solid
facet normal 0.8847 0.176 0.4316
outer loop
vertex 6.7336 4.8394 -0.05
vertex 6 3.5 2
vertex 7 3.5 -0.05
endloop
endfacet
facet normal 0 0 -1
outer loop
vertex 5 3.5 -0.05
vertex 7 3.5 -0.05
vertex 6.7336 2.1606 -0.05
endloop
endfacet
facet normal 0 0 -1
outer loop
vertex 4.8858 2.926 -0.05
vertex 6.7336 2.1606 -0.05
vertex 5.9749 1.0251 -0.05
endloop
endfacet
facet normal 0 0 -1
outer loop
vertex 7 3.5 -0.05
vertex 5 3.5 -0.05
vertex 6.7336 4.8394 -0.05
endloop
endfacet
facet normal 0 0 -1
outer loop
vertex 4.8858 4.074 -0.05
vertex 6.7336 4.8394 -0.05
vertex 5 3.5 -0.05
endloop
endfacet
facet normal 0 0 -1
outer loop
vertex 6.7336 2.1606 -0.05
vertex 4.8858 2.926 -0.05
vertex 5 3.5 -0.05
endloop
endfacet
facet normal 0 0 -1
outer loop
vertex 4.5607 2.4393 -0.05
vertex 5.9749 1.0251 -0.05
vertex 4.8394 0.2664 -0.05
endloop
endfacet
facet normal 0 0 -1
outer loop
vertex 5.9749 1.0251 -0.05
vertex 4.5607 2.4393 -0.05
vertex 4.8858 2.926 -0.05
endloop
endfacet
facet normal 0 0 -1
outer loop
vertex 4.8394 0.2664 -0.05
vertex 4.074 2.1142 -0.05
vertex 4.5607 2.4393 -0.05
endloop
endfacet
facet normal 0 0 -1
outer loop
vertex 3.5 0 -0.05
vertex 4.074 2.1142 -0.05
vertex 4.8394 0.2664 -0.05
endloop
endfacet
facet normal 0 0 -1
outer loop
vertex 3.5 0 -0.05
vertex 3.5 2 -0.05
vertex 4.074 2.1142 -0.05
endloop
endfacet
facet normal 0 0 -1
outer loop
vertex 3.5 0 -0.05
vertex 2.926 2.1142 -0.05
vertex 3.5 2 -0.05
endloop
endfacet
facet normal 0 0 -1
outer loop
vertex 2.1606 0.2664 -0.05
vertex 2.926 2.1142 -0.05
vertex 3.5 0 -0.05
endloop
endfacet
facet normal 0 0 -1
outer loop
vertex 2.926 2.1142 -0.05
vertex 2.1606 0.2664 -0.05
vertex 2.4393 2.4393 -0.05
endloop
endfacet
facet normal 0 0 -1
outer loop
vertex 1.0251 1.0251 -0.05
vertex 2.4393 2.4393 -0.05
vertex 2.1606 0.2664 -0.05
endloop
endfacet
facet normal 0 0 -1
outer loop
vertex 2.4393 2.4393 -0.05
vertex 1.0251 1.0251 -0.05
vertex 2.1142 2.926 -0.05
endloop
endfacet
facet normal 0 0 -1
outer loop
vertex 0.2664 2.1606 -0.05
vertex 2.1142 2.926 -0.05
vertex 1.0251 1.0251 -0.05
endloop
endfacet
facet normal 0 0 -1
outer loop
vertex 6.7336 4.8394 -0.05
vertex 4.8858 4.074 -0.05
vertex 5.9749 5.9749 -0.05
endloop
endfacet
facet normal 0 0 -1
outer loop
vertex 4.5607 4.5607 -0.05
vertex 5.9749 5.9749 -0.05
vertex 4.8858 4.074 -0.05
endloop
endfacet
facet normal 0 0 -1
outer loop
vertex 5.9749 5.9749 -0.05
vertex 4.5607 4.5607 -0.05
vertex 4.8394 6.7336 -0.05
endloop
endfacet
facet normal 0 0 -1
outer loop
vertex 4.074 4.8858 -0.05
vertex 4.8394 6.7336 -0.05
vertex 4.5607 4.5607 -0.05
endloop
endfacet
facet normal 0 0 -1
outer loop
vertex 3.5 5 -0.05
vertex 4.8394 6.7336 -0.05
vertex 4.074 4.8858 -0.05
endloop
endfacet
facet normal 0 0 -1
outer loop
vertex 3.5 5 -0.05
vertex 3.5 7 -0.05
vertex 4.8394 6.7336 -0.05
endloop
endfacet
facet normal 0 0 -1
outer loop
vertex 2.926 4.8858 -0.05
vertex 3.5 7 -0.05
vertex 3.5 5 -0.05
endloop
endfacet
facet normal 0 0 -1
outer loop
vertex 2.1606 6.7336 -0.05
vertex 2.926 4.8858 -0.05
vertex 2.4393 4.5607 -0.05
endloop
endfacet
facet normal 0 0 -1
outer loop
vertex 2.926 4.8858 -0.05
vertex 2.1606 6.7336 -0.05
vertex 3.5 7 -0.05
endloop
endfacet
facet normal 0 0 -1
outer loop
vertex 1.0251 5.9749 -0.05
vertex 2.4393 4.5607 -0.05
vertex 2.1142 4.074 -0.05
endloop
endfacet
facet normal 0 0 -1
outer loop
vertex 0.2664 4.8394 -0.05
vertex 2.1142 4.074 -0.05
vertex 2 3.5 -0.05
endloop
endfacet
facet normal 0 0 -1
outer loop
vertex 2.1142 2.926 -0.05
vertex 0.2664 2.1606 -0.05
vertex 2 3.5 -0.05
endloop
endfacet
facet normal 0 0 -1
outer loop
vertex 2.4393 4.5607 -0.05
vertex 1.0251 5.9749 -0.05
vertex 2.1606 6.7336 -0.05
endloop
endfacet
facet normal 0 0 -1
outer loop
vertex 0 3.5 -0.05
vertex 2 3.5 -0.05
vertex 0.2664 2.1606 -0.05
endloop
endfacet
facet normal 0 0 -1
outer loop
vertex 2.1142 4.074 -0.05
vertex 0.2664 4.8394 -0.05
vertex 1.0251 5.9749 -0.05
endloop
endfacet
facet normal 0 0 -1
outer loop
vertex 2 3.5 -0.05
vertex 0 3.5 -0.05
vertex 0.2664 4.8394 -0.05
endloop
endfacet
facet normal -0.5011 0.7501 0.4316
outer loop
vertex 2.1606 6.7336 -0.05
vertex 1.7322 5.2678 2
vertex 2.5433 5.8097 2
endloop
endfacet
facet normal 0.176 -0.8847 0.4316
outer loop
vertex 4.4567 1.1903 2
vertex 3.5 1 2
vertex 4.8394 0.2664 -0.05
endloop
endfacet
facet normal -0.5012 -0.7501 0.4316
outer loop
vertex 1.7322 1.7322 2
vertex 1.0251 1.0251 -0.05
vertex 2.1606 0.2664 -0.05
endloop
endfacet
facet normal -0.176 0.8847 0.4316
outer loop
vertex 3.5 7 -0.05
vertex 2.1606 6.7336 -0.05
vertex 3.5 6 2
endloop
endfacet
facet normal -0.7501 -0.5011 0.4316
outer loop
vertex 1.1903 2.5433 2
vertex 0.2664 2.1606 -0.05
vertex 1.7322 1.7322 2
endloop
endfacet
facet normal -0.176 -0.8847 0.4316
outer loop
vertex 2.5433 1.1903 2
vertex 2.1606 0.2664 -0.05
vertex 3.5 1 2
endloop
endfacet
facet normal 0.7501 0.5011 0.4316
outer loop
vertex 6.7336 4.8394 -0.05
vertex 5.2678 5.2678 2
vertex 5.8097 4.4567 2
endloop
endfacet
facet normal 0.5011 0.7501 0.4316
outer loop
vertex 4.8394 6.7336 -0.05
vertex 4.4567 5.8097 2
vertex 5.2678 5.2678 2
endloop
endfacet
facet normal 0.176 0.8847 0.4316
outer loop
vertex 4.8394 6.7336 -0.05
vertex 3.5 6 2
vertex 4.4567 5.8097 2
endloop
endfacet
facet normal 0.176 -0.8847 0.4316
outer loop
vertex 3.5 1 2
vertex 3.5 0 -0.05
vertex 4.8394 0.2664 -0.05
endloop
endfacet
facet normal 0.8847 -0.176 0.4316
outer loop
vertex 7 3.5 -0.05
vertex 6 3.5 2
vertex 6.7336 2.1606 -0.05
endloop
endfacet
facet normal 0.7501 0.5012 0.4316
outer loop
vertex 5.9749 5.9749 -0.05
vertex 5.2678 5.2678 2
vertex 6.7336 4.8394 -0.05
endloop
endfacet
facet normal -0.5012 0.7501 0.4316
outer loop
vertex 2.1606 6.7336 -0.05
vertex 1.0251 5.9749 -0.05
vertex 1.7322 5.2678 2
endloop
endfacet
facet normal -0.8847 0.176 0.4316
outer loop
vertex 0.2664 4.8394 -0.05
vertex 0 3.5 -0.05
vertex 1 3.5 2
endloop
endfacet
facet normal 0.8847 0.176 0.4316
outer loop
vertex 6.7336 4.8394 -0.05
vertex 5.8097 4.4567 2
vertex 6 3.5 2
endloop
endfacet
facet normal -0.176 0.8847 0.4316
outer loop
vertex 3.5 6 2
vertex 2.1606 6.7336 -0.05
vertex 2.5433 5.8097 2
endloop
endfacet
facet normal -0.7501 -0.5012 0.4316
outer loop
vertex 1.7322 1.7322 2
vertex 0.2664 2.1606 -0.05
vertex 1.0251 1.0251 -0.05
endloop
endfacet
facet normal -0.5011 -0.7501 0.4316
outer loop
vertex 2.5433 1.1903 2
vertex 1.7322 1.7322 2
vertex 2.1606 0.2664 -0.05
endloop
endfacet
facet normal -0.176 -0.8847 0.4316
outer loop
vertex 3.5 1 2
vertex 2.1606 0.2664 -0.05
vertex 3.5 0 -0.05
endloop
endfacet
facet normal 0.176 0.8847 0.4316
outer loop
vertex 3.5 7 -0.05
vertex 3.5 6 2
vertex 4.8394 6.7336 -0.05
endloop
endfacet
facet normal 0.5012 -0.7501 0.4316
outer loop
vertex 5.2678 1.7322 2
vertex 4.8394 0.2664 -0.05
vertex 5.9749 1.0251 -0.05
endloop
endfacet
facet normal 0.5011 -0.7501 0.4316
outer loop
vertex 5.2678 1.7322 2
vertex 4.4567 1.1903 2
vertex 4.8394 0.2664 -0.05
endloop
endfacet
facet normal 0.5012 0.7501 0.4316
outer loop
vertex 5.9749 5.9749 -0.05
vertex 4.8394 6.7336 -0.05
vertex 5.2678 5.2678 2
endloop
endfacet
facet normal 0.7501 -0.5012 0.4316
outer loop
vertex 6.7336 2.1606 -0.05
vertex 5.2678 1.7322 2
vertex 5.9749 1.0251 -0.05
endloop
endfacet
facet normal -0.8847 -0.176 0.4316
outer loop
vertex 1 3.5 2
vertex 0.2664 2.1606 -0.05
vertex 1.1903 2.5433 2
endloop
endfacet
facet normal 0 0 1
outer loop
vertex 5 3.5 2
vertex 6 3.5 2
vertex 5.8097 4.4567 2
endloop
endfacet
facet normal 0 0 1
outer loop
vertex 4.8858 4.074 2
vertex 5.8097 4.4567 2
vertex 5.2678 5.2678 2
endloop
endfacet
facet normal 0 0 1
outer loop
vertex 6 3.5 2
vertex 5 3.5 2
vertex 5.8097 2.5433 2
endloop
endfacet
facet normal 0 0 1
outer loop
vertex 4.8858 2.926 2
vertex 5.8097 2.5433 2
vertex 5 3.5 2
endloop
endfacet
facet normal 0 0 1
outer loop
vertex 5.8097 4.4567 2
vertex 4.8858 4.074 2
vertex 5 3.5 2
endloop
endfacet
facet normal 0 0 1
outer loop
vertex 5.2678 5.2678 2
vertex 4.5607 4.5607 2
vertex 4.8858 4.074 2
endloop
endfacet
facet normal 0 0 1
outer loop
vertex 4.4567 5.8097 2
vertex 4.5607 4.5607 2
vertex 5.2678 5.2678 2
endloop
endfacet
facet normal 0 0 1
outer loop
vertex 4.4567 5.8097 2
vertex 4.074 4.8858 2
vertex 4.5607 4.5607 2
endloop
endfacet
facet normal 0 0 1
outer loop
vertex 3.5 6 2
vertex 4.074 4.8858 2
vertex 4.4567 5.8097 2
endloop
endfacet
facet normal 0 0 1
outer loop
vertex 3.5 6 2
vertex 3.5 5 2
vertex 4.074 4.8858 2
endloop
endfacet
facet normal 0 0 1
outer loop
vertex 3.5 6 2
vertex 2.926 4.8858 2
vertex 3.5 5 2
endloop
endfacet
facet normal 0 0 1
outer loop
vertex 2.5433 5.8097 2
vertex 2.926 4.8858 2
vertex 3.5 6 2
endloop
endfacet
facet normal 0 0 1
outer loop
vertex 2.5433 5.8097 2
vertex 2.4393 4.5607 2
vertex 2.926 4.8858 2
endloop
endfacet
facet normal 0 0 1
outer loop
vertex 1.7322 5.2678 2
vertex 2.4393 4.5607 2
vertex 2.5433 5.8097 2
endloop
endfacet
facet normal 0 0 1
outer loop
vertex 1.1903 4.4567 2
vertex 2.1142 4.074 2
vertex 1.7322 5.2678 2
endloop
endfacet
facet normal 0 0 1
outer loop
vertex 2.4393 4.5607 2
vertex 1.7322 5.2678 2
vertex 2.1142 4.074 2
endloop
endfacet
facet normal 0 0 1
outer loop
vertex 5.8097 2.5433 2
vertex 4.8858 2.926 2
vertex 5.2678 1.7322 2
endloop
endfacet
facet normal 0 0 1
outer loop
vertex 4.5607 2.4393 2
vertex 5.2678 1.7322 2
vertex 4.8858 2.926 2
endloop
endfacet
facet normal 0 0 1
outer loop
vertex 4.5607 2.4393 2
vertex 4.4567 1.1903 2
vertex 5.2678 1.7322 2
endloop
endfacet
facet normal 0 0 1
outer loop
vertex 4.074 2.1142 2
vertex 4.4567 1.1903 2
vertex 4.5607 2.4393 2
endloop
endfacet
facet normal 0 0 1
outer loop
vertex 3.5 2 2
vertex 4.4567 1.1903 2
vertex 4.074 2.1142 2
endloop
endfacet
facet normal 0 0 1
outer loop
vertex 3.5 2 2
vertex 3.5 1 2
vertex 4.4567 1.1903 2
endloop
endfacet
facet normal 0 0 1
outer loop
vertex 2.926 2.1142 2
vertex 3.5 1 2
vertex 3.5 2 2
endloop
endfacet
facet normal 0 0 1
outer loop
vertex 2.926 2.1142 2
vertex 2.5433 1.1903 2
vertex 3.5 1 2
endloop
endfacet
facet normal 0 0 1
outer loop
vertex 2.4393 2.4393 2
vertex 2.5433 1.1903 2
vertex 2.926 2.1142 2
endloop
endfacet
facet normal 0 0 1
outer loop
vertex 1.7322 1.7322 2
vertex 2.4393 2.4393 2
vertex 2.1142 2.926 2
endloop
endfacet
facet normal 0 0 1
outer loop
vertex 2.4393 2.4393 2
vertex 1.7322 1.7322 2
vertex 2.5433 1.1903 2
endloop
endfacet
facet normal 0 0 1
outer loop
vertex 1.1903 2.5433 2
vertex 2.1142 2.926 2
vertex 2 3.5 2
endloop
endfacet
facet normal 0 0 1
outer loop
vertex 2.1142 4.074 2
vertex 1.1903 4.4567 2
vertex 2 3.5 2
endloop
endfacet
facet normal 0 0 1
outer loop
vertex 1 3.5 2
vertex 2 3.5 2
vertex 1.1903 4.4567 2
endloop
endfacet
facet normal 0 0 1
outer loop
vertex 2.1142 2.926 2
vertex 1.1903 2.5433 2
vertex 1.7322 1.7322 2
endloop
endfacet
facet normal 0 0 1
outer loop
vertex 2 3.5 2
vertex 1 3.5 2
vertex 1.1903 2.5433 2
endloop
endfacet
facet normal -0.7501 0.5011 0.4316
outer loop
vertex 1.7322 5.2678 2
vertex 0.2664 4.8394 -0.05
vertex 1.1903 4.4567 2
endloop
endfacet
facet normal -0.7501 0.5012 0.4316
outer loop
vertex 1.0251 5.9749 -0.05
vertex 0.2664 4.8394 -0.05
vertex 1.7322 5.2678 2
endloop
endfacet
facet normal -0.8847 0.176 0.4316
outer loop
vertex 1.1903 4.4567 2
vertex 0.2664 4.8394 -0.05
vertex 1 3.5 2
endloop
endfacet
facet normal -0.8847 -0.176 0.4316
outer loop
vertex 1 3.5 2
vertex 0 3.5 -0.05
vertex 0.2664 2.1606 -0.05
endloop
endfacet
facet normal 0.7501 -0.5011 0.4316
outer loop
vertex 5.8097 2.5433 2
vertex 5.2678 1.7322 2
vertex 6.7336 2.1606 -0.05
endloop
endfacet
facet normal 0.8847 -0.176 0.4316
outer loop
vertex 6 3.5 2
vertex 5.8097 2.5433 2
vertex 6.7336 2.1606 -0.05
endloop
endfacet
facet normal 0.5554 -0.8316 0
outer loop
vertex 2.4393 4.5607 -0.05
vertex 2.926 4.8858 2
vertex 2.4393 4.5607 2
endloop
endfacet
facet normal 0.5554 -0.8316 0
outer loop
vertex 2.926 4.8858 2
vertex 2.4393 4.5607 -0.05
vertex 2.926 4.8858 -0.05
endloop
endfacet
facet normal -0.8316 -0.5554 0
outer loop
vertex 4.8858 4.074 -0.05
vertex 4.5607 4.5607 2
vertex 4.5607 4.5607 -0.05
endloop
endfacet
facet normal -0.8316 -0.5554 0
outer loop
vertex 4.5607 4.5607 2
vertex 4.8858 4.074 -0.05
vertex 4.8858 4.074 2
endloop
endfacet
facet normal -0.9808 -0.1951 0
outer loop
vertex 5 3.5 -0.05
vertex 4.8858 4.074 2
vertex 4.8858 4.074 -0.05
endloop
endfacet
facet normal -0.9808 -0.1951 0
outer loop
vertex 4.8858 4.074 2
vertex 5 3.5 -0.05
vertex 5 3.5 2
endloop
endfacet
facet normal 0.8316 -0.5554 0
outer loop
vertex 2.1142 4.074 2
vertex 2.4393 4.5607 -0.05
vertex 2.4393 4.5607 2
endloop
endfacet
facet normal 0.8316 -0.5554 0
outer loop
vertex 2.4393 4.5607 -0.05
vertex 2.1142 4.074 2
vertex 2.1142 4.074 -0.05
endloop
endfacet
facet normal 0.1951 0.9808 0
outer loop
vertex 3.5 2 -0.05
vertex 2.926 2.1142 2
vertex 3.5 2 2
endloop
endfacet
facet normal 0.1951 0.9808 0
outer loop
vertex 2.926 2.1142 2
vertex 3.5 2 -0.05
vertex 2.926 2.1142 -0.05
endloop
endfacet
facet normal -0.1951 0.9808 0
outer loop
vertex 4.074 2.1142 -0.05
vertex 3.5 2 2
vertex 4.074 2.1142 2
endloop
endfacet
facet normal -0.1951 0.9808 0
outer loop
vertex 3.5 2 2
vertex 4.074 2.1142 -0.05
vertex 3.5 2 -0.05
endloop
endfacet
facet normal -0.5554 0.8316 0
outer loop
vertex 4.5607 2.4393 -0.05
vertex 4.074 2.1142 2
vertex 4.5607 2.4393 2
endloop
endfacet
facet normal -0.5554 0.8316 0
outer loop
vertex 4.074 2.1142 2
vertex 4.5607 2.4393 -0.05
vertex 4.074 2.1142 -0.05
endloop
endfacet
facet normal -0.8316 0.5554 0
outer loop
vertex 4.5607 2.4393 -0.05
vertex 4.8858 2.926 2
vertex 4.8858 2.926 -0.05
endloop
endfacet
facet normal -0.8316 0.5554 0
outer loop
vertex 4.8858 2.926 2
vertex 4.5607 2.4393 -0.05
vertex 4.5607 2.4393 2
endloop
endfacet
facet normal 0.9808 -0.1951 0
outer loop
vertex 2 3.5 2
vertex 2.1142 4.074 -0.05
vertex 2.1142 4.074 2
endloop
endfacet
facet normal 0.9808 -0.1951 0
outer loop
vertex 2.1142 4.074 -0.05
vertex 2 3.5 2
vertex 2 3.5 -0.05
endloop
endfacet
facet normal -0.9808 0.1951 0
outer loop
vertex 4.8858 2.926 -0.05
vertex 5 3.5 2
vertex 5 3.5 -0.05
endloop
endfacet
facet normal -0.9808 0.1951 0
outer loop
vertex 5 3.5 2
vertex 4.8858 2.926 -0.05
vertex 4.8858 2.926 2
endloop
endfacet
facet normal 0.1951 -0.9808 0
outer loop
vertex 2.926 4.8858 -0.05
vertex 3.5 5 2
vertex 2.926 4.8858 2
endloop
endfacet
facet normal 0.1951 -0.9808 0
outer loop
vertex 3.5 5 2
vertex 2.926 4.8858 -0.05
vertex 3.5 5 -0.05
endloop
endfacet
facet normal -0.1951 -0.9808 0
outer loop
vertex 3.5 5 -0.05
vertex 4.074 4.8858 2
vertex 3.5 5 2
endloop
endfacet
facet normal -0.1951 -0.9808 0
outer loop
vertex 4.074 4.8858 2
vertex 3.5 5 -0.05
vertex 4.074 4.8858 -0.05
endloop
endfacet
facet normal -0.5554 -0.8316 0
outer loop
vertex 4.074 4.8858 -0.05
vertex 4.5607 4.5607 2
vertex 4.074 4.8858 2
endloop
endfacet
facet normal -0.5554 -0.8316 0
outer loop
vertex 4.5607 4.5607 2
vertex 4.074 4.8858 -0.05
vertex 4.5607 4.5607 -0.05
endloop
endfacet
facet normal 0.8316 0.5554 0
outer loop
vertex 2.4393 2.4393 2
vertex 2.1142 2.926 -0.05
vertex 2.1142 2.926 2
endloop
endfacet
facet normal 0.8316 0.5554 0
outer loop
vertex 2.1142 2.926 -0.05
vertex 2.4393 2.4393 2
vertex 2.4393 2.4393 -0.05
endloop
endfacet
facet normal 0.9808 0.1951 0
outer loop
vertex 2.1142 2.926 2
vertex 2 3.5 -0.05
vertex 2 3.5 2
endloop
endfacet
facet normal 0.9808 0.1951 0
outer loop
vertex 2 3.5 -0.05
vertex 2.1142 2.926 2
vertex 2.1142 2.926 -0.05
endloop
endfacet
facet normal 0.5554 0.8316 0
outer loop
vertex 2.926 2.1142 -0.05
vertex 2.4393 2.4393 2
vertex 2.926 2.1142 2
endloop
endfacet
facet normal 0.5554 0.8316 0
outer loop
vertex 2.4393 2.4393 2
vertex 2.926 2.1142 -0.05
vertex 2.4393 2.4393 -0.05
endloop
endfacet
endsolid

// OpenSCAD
module stand(
height=3,
inner_diam=3,
top_diam=5,
bottom_diam=7,
center_xy=false,
attach=0.001,
quality=0, //0 and up, 0 - use $fn
)
{
	assert(height>0)
	assert(inner_diam>0)
	assert(top_diam>0)
	assert(bottom_diam>0)
	assert(attach>=0)
	assert(inner_diam<top_diam)
	assert(bottom_diam>top_diam)
	assert(quality>=0);
	fn=quality>0?8*quality:$fn;
	translate([center_xy?0:bottom_diam/2,center_xy?0:bottom_diam/2,-attach])
	difference()
	{
			cylinder(h=height+attach,d1=bottom_diam,d2=top_diam,$fn=fn);
			cylinder(h=(height+attach)*3,d=inner_diam,center=true,$fn=fn);
	}
}

//stand();
//stand(height=2,attach=0.05,$fn=4);
//stand(height=2,attach=0.05,$fn=8);
//stand(height=2,attach=0.05,quality=1);
stand(height=2,attach=0.05,quality=2);
